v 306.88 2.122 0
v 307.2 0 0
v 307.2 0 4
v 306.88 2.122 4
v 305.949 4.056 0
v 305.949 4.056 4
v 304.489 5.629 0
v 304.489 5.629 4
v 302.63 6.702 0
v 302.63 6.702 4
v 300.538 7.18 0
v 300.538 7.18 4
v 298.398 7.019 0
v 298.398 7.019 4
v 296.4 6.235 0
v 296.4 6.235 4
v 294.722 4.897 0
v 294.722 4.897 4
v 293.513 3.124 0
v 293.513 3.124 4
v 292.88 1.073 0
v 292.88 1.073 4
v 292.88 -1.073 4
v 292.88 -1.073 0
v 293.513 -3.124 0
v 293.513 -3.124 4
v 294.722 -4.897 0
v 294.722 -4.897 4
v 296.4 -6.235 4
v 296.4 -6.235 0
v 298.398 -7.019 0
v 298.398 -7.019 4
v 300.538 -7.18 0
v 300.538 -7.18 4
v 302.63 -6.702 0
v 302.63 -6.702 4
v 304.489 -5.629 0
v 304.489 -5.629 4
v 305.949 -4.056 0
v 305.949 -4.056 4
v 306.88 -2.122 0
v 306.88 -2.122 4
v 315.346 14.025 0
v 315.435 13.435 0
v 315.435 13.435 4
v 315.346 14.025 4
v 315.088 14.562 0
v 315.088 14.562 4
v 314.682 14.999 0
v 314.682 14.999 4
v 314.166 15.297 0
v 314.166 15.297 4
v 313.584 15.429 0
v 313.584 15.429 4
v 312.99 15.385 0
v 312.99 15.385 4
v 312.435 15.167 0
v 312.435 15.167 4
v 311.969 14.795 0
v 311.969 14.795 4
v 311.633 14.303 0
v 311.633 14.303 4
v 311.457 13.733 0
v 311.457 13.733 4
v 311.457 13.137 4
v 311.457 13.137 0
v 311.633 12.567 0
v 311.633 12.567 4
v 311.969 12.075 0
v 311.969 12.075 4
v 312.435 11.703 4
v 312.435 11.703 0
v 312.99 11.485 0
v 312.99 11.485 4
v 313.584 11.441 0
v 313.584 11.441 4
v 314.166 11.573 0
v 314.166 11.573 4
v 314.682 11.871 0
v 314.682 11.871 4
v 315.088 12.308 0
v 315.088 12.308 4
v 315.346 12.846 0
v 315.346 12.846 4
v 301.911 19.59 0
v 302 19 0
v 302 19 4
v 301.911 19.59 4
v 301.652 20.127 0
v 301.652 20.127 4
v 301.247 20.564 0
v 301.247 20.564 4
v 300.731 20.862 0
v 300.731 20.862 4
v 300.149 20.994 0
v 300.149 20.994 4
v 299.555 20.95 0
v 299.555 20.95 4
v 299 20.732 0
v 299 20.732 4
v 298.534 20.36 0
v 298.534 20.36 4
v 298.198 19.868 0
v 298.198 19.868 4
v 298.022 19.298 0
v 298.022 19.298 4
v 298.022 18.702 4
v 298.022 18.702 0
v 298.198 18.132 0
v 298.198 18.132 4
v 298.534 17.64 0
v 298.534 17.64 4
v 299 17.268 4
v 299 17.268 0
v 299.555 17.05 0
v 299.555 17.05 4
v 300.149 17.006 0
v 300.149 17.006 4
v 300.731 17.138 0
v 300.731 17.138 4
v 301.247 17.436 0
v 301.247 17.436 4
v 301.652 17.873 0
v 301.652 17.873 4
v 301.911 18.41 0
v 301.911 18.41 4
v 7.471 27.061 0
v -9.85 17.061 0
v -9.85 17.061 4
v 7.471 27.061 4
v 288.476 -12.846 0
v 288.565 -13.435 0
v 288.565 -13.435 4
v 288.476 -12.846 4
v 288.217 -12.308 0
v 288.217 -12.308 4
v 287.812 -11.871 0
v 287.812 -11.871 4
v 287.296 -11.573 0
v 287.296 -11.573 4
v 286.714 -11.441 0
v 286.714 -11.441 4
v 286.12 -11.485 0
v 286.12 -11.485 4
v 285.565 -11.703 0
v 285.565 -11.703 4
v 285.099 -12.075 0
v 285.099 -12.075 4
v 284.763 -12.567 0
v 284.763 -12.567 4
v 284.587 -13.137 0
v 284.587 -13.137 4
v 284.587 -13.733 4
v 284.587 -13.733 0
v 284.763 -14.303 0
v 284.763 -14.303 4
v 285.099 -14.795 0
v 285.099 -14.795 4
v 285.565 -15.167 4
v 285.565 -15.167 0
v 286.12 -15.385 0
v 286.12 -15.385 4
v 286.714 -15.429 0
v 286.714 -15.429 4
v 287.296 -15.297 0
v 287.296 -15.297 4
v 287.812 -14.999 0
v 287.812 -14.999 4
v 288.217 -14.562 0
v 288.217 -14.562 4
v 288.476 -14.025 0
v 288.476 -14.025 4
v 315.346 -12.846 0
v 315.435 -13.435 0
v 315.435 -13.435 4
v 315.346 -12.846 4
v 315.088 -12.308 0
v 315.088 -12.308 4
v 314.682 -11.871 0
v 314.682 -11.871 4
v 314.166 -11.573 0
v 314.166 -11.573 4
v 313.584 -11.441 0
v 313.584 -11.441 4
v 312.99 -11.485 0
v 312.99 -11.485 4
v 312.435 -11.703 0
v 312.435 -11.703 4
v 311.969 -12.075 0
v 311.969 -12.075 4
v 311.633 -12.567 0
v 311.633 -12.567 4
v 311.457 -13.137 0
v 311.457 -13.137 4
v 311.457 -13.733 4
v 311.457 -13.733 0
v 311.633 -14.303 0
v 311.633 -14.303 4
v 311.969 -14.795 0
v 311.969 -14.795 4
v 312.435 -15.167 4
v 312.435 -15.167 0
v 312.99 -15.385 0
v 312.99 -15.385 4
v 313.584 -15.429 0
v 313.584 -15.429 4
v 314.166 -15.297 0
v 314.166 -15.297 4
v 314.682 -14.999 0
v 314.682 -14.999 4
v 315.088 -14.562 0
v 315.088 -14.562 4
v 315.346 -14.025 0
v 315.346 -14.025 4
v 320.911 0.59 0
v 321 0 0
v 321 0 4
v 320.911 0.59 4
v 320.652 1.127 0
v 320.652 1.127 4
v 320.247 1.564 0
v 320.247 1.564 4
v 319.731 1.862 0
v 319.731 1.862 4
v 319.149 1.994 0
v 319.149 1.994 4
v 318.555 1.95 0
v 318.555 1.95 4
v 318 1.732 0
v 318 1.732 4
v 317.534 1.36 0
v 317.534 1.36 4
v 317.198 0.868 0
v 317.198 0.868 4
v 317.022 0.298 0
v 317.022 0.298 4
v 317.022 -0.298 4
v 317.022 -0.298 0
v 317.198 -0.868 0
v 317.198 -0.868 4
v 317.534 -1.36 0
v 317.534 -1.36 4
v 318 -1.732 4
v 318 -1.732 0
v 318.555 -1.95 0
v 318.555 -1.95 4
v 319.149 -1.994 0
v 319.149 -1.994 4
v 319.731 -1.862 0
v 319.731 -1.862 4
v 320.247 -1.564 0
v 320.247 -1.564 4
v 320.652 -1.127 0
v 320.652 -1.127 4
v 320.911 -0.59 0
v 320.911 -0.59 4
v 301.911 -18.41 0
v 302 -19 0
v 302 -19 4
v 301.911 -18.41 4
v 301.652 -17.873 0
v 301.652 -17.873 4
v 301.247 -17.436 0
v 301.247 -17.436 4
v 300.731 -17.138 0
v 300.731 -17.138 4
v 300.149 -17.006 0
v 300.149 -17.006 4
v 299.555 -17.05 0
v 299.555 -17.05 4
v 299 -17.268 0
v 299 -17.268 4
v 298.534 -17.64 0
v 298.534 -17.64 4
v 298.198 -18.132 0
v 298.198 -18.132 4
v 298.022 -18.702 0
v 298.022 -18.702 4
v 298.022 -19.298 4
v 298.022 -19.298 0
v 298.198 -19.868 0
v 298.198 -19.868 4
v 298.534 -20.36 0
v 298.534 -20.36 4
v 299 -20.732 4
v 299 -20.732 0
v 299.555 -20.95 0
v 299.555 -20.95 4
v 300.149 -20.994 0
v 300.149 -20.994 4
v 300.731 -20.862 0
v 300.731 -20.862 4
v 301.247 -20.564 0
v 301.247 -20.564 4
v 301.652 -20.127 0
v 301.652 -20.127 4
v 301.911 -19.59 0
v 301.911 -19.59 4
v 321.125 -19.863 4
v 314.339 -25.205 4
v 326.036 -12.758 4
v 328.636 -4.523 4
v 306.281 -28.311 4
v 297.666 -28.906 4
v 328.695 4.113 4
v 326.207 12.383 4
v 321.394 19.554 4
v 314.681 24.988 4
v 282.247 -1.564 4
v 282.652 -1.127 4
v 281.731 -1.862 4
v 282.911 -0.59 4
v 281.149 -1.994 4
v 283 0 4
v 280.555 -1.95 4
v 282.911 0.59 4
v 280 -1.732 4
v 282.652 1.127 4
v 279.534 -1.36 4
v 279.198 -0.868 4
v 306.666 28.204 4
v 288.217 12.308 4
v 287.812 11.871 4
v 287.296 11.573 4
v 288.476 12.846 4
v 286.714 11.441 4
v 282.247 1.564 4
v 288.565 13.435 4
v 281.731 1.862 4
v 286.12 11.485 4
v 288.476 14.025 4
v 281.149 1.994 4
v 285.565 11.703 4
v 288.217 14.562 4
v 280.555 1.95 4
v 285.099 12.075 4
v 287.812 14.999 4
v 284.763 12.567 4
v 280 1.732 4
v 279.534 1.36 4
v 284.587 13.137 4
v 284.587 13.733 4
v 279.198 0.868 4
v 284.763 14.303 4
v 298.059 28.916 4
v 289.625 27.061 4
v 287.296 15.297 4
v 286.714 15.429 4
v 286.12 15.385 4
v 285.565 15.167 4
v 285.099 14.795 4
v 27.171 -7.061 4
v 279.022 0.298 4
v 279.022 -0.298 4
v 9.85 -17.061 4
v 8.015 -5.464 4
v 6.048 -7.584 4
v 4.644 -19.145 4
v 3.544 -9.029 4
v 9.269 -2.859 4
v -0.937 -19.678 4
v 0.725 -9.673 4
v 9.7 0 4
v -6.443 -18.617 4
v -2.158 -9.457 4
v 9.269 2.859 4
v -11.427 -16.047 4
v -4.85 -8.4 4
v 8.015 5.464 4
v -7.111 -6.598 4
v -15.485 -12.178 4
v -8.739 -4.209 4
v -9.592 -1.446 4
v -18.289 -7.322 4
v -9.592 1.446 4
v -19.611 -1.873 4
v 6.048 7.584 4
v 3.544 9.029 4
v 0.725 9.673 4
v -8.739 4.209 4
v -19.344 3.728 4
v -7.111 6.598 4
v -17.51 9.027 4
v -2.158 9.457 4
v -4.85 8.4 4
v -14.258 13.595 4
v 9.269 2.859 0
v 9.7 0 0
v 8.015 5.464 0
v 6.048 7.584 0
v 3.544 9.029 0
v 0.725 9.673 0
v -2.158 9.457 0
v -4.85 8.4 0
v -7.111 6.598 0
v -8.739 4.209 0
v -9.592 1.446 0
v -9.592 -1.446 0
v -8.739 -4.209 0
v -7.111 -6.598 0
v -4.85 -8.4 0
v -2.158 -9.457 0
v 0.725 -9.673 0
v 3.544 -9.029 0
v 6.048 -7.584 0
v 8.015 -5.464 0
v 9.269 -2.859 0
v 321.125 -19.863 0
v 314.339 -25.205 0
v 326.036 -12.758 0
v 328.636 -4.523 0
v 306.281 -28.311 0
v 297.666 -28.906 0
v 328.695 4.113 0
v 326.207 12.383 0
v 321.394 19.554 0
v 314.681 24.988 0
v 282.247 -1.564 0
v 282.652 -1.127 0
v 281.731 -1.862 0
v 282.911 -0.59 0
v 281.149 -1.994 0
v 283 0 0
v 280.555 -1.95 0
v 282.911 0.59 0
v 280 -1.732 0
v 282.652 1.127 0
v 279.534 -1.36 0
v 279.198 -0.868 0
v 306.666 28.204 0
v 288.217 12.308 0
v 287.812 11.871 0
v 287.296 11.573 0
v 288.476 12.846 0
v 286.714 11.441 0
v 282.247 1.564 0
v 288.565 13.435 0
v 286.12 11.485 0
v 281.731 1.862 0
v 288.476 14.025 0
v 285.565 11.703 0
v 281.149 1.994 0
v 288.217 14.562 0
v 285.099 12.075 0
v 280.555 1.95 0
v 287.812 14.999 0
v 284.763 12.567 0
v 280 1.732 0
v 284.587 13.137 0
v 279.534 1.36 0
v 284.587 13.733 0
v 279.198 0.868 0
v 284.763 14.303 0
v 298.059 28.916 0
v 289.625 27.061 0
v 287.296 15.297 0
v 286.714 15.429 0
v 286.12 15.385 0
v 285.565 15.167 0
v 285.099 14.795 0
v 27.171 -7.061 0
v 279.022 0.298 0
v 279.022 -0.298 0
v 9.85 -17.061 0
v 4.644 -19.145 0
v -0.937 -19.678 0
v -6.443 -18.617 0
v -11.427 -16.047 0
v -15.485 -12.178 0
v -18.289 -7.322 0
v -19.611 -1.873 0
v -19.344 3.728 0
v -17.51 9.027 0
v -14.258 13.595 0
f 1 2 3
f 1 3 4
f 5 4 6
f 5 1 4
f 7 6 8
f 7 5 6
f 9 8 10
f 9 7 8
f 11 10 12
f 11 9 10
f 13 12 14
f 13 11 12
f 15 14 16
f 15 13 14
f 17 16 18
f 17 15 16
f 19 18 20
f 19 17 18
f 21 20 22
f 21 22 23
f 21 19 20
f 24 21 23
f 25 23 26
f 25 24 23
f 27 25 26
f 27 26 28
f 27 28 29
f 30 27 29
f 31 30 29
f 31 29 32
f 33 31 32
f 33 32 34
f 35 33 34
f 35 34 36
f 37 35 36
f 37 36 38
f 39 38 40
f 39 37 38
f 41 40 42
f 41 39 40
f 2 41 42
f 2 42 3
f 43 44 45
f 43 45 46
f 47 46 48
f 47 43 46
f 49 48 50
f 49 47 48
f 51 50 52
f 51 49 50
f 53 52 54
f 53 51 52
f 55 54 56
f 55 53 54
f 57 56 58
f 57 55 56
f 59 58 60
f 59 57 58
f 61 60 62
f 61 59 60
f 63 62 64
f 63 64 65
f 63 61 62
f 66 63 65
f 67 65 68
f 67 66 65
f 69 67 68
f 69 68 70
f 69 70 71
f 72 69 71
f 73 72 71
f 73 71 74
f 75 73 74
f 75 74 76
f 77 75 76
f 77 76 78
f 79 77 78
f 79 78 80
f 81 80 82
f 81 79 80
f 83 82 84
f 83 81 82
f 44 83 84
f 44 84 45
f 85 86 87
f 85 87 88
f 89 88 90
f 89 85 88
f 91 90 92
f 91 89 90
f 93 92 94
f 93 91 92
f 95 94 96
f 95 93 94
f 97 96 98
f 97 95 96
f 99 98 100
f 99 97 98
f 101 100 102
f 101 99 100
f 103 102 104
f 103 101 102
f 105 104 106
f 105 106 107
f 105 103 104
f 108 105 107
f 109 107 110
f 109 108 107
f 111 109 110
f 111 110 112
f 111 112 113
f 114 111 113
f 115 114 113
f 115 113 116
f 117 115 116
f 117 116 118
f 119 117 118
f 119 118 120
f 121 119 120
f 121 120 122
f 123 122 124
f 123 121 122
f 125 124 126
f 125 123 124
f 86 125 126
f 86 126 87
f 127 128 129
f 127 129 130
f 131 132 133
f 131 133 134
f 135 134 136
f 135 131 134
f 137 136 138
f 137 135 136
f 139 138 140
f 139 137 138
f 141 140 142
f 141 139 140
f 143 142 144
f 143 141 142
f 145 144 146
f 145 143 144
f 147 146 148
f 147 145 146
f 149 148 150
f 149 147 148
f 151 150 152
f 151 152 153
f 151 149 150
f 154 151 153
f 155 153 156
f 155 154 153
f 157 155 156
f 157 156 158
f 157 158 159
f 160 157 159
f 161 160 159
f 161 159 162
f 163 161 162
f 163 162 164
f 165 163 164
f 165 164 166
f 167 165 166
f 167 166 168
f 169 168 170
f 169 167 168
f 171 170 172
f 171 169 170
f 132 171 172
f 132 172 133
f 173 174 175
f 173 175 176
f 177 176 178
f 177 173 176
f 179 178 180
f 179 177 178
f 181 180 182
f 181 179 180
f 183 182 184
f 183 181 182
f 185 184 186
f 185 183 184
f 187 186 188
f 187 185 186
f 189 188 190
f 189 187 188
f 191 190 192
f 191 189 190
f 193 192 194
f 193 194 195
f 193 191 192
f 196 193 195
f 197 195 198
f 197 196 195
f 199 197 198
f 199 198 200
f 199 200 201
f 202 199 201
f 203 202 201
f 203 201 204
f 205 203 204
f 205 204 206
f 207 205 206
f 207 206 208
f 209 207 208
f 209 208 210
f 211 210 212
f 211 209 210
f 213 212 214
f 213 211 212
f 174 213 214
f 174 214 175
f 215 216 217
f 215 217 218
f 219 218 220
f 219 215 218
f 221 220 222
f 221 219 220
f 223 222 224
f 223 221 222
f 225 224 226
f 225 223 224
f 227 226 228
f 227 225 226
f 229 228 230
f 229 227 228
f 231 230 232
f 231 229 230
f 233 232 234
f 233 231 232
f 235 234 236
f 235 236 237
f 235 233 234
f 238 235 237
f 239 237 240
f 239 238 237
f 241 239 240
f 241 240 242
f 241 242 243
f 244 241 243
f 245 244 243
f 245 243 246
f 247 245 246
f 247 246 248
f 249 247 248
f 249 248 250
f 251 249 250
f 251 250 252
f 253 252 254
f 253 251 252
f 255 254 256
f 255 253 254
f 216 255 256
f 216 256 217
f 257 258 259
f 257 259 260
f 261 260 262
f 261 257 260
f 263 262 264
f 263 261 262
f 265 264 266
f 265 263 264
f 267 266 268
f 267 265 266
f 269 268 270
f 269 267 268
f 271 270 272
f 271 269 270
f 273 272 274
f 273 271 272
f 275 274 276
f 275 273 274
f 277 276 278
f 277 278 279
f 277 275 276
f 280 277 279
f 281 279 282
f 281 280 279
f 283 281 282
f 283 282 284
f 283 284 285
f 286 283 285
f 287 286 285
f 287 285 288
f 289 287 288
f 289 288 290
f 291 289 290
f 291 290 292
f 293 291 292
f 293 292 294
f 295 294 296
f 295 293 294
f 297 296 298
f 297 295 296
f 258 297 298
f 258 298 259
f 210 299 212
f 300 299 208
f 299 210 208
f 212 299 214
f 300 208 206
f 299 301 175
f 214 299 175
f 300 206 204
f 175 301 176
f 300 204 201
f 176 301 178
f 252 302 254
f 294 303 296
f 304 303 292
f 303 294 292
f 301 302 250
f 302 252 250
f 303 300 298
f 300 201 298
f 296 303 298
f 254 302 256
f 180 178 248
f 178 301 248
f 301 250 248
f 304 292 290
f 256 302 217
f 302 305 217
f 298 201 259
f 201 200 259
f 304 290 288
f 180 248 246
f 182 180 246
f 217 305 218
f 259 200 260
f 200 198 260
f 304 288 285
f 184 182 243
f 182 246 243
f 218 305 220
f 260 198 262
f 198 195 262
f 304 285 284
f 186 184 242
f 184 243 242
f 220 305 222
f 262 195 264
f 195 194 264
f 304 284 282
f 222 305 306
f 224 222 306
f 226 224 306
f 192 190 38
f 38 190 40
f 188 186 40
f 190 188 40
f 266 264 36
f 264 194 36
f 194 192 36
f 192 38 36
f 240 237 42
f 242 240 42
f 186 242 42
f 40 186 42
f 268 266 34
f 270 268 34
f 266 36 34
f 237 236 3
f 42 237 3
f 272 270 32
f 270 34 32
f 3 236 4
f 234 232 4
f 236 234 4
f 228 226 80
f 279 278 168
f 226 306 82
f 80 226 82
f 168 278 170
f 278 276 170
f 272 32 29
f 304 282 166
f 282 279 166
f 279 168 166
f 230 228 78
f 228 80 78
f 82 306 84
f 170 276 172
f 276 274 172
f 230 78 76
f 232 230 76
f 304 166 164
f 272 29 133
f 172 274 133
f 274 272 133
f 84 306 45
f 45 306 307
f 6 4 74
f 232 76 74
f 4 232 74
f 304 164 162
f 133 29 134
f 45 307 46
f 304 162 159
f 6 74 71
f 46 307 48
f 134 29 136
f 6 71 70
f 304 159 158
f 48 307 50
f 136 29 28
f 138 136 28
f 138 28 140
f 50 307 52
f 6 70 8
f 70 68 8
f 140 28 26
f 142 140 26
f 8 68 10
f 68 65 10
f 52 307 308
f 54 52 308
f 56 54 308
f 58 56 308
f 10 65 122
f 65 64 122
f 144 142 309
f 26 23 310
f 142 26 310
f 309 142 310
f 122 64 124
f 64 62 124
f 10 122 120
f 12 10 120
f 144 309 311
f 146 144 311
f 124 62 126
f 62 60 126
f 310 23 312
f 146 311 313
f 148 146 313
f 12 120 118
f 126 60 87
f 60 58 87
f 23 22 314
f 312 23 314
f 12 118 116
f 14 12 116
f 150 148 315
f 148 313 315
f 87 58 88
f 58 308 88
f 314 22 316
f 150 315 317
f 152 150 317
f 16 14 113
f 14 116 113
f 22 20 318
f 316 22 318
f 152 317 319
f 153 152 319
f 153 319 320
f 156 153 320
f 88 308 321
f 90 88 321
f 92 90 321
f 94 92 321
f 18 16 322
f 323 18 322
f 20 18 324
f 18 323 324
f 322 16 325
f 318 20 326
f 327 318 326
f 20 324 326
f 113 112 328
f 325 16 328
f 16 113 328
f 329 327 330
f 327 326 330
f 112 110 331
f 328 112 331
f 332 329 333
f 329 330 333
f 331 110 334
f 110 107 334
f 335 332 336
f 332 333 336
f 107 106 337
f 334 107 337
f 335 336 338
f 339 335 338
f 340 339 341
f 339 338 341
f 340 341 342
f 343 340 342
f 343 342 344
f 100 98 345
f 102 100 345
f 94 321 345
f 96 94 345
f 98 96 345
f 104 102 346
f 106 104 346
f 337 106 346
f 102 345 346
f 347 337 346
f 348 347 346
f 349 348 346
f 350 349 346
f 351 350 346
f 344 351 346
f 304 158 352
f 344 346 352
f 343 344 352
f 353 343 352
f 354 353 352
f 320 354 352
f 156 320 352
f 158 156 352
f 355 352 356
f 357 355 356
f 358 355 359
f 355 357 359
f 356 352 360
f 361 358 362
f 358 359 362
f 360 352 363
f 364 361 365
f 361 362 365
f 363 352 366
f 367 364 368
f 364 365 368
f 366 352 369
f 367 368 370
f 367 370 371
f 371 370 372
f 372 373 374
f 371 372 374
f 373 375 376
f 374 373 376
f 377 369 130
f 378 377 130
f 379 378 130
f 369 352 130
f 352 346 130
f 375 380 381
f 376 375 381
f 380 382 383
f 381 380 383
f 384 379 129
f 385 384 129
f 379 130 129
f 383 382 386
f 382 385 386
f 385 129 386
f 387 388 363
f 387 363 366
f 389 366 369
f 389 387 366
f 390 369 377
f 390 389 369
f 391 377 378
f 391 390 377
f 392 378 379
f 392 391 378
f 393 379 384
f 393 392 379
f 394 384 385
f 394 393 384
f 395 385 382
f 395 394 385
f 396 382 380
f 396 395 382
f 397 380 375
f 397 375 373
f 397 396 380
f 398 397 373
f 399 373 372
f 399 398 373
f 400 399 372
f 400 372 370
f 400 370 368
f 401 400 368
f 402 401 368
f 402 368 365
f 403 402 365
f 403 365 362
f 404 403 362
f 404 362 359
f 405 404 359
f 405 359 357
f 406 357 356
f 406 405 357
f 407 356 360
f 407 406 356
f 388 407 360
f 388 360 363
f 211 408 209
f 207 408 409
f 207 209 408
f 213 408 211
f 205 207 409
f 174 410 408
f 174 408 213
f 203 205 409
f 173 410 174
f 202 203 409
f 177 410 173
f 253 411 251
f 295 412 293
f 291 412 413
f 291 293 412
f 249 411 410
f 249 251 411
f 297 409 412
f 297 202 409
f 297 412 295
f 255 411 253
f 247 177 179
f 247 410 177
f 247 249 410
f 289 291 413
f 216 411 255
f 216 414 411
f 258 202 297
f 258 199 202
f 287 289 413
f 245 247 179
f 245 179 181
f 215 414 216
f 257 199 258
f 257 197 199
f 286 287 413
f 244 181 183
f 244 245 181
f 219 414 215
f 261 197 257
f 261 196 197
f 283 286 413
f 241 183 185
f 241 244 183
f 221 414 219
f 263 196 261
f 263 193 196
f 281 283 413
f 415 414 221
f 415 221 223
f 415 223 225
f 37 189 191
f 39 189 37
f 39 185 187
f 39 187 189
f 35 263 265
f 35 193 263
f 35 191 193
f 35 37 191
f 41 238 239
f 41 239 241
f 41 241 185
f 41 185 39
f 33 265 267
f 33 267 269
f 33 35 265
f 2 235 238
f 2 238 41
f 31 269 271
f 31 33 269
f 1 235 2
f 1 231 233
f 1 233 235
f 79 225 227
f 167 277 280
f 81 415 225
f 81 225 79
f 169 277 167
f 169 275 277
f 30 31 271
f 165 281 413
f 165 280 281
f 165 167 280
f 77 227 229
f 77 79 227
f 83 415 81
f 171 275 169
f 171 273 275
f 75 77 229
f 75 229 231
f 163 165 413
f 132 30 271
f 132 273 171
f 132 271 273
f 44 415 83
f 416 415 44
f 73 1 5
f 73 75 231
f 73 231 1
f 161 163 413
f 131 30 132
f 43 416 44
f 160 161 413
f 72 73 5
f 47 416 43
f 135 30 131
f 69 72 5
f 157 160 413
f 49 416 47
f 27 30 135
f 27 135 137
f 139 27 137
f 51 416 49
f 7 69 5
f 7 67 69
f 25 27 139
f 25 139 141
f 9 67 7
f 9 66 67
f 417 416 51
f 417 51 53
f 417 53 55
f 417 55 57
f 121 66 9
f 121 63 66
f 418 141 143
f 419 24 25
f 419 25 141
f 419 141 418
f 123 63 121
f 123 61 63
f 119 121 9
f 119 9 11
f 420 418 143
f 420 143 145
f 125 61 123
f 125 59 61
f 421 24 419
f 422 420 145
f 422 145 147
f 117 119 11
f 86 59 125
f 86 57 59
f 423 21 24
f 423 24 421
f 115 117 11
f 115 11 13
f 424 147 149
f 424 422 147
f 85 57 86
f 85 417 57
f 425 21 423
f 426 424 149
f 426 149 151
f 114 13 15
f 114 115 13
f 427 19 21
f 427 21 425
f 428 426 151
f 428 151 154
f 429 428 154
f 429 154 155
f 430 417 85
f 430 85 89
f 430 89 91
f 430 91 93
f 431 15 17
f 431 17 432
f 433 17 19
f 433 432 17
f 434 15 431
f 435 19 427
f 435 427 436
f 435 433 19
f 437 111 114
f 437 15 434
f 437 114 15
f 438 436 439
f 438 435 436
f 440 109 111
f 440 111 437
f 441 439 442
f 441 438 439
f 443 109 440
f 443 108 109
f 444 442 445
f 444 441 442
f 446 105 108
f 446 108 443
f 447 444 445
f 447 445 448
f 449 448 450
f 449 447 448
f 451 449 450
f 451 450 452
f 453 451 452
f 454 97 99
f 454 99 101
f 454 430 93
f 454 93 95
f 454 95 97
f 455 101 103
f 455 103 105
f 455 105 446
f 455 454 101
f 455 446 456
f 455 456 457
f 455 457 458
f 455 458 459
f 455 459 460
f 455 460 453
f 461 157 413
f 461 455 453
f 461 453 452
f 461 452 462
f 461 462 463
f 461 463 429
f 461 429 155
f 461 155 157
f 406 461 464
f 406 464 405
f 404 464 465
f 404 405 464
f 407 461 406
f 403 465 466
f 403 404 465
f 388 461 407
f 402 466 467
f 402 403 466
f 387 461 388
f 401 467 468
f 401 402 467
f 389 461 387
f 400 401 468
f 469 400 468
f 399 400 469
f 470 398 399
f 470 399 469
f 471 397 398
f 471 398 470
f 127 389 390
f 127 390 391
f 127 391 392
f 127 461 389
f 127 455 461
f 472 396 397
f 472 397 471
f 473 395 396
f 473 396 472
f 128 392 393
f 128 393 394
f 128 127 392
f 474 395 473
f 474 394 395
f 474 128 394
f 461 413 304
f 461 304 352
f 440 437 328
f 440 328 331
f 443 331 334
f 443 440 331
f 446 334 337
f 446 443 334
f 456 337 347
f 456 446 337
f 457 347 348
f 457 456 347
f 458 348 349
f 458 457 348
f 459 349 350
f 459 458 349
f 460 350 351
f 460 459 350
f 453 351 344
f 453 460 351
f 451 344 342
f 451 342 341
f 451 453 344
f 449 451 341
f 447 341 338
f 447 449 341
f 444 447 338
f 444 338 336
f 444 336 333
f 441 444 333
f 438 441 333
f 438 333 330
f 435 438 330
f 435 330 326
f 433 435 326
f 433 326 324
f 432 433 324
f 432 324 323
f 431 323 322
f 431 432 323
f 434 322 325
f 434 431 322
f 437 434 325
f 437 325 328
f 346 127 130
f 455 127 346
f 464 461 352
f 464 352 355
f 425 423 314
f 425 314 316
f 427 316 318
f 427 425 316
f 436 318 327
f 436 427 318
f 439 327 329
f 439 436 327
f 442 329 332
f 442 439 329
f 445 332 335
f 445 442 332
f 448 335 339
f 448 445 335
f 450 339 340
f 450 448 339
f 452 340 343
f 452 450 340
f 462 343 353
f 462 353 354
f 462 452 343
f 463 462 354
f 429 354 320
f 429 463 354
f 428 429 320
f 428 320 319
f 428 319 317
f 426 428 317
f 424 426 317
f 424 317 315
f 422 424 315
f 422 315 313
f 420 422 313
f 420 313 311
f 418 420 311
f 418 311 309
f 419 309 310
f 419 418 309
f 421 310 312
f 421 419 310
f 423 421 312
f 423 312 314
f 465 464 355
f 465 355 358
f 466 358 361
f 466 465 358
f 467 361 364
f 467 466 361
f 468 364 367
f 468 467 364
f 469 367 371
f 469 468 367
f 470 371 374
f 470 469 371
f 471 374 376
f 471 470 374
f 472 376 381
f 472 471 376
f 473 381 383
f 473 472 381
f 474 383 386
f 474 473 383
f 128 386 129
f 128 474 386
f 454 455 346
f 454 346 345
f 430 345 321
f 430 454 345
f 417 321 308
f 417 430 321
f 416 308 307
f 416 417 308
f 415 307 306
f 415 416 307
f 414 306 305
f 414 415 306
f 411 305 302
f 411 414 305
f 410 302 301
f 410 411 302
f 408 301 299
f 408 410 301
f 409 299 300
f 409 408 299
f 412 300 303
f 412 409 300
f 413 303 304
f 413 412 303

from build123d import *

# Parameters (mm, degrees)
SKETCH_1_R      = 9.7
SKETCH_1_R_2    = 7.2
SKETCH_1_R_3    = 2
EXTRUDE_1_DEPTH = 4


with BuildPart() as part:
    # 草图1 → 凸台-拉伸1 (new body)
    with BuildSketch(Plane.XY):
        with BuildLine():
            Line((-9.85, 17.060700455), (7.470508076, 27.060700455))
            Line((7.470508076, 27.060700455), (289.624667154, 27.060700455))
            ThreePointArc((289.624667154, 27.060700455), (328.694852344, 4.11311011), (297.66555963, -28.905888469))
            Line((297.66555963, -28.905888469), (27.170508076, -7.060700455))
            Line((27.170508076, -7.060700455), (9.85, -17.060700455))
            ThreePointArc((9.85, -17.060700455), (-17.060700455, -9.85), (-9.85, 17.060700455))
        make_face()
        Circle(SKETCH_1_R, mode=Mode.SUBTRACT)
        with Locations((300, 0)):
            Circle(SKETCH_1_R_2, mode=Mode.SUBTRACT)
        with Locations((319, 0)):
            Circle(SKETCH_1_R_3, mode=Mode.SUBTRACT)
        with Locations((313.435028843, -13.435028843)):
            Circle(SKETCH_1_R_3, mode=Mode.SUBTRACT)
        with Locations((300, -19)):
            Circle(SKETCH_1_R_3, mode=Mode.SUBTRACT)
        with Locations((286.564971157, -13.435028843)):
            Circle(SKETCH_1_R_3, mode=Mode.SUBTRACT)
        with Locations((281, 0)):
            Circle(SKETCH_1_R_3, mode=Mode.SUBTRACT)
        with Locations((286.564971157, 13.435028843)):
            Circle(SKETCH_1_R_3, mode=Mode.SUBTRACT)
        with Locations((300, 19)):
            Circle(SKETCH_1_R_3, mode=Mode.SUBTRACT)
        with Locations((313.435028843, 13.435028843)):
            Circle(SKETCH_1_R_3, mode=Mode.SUBTRACT)
    extrude(amount=EXTRUDE_1_DEPTH)


solid = part.part
